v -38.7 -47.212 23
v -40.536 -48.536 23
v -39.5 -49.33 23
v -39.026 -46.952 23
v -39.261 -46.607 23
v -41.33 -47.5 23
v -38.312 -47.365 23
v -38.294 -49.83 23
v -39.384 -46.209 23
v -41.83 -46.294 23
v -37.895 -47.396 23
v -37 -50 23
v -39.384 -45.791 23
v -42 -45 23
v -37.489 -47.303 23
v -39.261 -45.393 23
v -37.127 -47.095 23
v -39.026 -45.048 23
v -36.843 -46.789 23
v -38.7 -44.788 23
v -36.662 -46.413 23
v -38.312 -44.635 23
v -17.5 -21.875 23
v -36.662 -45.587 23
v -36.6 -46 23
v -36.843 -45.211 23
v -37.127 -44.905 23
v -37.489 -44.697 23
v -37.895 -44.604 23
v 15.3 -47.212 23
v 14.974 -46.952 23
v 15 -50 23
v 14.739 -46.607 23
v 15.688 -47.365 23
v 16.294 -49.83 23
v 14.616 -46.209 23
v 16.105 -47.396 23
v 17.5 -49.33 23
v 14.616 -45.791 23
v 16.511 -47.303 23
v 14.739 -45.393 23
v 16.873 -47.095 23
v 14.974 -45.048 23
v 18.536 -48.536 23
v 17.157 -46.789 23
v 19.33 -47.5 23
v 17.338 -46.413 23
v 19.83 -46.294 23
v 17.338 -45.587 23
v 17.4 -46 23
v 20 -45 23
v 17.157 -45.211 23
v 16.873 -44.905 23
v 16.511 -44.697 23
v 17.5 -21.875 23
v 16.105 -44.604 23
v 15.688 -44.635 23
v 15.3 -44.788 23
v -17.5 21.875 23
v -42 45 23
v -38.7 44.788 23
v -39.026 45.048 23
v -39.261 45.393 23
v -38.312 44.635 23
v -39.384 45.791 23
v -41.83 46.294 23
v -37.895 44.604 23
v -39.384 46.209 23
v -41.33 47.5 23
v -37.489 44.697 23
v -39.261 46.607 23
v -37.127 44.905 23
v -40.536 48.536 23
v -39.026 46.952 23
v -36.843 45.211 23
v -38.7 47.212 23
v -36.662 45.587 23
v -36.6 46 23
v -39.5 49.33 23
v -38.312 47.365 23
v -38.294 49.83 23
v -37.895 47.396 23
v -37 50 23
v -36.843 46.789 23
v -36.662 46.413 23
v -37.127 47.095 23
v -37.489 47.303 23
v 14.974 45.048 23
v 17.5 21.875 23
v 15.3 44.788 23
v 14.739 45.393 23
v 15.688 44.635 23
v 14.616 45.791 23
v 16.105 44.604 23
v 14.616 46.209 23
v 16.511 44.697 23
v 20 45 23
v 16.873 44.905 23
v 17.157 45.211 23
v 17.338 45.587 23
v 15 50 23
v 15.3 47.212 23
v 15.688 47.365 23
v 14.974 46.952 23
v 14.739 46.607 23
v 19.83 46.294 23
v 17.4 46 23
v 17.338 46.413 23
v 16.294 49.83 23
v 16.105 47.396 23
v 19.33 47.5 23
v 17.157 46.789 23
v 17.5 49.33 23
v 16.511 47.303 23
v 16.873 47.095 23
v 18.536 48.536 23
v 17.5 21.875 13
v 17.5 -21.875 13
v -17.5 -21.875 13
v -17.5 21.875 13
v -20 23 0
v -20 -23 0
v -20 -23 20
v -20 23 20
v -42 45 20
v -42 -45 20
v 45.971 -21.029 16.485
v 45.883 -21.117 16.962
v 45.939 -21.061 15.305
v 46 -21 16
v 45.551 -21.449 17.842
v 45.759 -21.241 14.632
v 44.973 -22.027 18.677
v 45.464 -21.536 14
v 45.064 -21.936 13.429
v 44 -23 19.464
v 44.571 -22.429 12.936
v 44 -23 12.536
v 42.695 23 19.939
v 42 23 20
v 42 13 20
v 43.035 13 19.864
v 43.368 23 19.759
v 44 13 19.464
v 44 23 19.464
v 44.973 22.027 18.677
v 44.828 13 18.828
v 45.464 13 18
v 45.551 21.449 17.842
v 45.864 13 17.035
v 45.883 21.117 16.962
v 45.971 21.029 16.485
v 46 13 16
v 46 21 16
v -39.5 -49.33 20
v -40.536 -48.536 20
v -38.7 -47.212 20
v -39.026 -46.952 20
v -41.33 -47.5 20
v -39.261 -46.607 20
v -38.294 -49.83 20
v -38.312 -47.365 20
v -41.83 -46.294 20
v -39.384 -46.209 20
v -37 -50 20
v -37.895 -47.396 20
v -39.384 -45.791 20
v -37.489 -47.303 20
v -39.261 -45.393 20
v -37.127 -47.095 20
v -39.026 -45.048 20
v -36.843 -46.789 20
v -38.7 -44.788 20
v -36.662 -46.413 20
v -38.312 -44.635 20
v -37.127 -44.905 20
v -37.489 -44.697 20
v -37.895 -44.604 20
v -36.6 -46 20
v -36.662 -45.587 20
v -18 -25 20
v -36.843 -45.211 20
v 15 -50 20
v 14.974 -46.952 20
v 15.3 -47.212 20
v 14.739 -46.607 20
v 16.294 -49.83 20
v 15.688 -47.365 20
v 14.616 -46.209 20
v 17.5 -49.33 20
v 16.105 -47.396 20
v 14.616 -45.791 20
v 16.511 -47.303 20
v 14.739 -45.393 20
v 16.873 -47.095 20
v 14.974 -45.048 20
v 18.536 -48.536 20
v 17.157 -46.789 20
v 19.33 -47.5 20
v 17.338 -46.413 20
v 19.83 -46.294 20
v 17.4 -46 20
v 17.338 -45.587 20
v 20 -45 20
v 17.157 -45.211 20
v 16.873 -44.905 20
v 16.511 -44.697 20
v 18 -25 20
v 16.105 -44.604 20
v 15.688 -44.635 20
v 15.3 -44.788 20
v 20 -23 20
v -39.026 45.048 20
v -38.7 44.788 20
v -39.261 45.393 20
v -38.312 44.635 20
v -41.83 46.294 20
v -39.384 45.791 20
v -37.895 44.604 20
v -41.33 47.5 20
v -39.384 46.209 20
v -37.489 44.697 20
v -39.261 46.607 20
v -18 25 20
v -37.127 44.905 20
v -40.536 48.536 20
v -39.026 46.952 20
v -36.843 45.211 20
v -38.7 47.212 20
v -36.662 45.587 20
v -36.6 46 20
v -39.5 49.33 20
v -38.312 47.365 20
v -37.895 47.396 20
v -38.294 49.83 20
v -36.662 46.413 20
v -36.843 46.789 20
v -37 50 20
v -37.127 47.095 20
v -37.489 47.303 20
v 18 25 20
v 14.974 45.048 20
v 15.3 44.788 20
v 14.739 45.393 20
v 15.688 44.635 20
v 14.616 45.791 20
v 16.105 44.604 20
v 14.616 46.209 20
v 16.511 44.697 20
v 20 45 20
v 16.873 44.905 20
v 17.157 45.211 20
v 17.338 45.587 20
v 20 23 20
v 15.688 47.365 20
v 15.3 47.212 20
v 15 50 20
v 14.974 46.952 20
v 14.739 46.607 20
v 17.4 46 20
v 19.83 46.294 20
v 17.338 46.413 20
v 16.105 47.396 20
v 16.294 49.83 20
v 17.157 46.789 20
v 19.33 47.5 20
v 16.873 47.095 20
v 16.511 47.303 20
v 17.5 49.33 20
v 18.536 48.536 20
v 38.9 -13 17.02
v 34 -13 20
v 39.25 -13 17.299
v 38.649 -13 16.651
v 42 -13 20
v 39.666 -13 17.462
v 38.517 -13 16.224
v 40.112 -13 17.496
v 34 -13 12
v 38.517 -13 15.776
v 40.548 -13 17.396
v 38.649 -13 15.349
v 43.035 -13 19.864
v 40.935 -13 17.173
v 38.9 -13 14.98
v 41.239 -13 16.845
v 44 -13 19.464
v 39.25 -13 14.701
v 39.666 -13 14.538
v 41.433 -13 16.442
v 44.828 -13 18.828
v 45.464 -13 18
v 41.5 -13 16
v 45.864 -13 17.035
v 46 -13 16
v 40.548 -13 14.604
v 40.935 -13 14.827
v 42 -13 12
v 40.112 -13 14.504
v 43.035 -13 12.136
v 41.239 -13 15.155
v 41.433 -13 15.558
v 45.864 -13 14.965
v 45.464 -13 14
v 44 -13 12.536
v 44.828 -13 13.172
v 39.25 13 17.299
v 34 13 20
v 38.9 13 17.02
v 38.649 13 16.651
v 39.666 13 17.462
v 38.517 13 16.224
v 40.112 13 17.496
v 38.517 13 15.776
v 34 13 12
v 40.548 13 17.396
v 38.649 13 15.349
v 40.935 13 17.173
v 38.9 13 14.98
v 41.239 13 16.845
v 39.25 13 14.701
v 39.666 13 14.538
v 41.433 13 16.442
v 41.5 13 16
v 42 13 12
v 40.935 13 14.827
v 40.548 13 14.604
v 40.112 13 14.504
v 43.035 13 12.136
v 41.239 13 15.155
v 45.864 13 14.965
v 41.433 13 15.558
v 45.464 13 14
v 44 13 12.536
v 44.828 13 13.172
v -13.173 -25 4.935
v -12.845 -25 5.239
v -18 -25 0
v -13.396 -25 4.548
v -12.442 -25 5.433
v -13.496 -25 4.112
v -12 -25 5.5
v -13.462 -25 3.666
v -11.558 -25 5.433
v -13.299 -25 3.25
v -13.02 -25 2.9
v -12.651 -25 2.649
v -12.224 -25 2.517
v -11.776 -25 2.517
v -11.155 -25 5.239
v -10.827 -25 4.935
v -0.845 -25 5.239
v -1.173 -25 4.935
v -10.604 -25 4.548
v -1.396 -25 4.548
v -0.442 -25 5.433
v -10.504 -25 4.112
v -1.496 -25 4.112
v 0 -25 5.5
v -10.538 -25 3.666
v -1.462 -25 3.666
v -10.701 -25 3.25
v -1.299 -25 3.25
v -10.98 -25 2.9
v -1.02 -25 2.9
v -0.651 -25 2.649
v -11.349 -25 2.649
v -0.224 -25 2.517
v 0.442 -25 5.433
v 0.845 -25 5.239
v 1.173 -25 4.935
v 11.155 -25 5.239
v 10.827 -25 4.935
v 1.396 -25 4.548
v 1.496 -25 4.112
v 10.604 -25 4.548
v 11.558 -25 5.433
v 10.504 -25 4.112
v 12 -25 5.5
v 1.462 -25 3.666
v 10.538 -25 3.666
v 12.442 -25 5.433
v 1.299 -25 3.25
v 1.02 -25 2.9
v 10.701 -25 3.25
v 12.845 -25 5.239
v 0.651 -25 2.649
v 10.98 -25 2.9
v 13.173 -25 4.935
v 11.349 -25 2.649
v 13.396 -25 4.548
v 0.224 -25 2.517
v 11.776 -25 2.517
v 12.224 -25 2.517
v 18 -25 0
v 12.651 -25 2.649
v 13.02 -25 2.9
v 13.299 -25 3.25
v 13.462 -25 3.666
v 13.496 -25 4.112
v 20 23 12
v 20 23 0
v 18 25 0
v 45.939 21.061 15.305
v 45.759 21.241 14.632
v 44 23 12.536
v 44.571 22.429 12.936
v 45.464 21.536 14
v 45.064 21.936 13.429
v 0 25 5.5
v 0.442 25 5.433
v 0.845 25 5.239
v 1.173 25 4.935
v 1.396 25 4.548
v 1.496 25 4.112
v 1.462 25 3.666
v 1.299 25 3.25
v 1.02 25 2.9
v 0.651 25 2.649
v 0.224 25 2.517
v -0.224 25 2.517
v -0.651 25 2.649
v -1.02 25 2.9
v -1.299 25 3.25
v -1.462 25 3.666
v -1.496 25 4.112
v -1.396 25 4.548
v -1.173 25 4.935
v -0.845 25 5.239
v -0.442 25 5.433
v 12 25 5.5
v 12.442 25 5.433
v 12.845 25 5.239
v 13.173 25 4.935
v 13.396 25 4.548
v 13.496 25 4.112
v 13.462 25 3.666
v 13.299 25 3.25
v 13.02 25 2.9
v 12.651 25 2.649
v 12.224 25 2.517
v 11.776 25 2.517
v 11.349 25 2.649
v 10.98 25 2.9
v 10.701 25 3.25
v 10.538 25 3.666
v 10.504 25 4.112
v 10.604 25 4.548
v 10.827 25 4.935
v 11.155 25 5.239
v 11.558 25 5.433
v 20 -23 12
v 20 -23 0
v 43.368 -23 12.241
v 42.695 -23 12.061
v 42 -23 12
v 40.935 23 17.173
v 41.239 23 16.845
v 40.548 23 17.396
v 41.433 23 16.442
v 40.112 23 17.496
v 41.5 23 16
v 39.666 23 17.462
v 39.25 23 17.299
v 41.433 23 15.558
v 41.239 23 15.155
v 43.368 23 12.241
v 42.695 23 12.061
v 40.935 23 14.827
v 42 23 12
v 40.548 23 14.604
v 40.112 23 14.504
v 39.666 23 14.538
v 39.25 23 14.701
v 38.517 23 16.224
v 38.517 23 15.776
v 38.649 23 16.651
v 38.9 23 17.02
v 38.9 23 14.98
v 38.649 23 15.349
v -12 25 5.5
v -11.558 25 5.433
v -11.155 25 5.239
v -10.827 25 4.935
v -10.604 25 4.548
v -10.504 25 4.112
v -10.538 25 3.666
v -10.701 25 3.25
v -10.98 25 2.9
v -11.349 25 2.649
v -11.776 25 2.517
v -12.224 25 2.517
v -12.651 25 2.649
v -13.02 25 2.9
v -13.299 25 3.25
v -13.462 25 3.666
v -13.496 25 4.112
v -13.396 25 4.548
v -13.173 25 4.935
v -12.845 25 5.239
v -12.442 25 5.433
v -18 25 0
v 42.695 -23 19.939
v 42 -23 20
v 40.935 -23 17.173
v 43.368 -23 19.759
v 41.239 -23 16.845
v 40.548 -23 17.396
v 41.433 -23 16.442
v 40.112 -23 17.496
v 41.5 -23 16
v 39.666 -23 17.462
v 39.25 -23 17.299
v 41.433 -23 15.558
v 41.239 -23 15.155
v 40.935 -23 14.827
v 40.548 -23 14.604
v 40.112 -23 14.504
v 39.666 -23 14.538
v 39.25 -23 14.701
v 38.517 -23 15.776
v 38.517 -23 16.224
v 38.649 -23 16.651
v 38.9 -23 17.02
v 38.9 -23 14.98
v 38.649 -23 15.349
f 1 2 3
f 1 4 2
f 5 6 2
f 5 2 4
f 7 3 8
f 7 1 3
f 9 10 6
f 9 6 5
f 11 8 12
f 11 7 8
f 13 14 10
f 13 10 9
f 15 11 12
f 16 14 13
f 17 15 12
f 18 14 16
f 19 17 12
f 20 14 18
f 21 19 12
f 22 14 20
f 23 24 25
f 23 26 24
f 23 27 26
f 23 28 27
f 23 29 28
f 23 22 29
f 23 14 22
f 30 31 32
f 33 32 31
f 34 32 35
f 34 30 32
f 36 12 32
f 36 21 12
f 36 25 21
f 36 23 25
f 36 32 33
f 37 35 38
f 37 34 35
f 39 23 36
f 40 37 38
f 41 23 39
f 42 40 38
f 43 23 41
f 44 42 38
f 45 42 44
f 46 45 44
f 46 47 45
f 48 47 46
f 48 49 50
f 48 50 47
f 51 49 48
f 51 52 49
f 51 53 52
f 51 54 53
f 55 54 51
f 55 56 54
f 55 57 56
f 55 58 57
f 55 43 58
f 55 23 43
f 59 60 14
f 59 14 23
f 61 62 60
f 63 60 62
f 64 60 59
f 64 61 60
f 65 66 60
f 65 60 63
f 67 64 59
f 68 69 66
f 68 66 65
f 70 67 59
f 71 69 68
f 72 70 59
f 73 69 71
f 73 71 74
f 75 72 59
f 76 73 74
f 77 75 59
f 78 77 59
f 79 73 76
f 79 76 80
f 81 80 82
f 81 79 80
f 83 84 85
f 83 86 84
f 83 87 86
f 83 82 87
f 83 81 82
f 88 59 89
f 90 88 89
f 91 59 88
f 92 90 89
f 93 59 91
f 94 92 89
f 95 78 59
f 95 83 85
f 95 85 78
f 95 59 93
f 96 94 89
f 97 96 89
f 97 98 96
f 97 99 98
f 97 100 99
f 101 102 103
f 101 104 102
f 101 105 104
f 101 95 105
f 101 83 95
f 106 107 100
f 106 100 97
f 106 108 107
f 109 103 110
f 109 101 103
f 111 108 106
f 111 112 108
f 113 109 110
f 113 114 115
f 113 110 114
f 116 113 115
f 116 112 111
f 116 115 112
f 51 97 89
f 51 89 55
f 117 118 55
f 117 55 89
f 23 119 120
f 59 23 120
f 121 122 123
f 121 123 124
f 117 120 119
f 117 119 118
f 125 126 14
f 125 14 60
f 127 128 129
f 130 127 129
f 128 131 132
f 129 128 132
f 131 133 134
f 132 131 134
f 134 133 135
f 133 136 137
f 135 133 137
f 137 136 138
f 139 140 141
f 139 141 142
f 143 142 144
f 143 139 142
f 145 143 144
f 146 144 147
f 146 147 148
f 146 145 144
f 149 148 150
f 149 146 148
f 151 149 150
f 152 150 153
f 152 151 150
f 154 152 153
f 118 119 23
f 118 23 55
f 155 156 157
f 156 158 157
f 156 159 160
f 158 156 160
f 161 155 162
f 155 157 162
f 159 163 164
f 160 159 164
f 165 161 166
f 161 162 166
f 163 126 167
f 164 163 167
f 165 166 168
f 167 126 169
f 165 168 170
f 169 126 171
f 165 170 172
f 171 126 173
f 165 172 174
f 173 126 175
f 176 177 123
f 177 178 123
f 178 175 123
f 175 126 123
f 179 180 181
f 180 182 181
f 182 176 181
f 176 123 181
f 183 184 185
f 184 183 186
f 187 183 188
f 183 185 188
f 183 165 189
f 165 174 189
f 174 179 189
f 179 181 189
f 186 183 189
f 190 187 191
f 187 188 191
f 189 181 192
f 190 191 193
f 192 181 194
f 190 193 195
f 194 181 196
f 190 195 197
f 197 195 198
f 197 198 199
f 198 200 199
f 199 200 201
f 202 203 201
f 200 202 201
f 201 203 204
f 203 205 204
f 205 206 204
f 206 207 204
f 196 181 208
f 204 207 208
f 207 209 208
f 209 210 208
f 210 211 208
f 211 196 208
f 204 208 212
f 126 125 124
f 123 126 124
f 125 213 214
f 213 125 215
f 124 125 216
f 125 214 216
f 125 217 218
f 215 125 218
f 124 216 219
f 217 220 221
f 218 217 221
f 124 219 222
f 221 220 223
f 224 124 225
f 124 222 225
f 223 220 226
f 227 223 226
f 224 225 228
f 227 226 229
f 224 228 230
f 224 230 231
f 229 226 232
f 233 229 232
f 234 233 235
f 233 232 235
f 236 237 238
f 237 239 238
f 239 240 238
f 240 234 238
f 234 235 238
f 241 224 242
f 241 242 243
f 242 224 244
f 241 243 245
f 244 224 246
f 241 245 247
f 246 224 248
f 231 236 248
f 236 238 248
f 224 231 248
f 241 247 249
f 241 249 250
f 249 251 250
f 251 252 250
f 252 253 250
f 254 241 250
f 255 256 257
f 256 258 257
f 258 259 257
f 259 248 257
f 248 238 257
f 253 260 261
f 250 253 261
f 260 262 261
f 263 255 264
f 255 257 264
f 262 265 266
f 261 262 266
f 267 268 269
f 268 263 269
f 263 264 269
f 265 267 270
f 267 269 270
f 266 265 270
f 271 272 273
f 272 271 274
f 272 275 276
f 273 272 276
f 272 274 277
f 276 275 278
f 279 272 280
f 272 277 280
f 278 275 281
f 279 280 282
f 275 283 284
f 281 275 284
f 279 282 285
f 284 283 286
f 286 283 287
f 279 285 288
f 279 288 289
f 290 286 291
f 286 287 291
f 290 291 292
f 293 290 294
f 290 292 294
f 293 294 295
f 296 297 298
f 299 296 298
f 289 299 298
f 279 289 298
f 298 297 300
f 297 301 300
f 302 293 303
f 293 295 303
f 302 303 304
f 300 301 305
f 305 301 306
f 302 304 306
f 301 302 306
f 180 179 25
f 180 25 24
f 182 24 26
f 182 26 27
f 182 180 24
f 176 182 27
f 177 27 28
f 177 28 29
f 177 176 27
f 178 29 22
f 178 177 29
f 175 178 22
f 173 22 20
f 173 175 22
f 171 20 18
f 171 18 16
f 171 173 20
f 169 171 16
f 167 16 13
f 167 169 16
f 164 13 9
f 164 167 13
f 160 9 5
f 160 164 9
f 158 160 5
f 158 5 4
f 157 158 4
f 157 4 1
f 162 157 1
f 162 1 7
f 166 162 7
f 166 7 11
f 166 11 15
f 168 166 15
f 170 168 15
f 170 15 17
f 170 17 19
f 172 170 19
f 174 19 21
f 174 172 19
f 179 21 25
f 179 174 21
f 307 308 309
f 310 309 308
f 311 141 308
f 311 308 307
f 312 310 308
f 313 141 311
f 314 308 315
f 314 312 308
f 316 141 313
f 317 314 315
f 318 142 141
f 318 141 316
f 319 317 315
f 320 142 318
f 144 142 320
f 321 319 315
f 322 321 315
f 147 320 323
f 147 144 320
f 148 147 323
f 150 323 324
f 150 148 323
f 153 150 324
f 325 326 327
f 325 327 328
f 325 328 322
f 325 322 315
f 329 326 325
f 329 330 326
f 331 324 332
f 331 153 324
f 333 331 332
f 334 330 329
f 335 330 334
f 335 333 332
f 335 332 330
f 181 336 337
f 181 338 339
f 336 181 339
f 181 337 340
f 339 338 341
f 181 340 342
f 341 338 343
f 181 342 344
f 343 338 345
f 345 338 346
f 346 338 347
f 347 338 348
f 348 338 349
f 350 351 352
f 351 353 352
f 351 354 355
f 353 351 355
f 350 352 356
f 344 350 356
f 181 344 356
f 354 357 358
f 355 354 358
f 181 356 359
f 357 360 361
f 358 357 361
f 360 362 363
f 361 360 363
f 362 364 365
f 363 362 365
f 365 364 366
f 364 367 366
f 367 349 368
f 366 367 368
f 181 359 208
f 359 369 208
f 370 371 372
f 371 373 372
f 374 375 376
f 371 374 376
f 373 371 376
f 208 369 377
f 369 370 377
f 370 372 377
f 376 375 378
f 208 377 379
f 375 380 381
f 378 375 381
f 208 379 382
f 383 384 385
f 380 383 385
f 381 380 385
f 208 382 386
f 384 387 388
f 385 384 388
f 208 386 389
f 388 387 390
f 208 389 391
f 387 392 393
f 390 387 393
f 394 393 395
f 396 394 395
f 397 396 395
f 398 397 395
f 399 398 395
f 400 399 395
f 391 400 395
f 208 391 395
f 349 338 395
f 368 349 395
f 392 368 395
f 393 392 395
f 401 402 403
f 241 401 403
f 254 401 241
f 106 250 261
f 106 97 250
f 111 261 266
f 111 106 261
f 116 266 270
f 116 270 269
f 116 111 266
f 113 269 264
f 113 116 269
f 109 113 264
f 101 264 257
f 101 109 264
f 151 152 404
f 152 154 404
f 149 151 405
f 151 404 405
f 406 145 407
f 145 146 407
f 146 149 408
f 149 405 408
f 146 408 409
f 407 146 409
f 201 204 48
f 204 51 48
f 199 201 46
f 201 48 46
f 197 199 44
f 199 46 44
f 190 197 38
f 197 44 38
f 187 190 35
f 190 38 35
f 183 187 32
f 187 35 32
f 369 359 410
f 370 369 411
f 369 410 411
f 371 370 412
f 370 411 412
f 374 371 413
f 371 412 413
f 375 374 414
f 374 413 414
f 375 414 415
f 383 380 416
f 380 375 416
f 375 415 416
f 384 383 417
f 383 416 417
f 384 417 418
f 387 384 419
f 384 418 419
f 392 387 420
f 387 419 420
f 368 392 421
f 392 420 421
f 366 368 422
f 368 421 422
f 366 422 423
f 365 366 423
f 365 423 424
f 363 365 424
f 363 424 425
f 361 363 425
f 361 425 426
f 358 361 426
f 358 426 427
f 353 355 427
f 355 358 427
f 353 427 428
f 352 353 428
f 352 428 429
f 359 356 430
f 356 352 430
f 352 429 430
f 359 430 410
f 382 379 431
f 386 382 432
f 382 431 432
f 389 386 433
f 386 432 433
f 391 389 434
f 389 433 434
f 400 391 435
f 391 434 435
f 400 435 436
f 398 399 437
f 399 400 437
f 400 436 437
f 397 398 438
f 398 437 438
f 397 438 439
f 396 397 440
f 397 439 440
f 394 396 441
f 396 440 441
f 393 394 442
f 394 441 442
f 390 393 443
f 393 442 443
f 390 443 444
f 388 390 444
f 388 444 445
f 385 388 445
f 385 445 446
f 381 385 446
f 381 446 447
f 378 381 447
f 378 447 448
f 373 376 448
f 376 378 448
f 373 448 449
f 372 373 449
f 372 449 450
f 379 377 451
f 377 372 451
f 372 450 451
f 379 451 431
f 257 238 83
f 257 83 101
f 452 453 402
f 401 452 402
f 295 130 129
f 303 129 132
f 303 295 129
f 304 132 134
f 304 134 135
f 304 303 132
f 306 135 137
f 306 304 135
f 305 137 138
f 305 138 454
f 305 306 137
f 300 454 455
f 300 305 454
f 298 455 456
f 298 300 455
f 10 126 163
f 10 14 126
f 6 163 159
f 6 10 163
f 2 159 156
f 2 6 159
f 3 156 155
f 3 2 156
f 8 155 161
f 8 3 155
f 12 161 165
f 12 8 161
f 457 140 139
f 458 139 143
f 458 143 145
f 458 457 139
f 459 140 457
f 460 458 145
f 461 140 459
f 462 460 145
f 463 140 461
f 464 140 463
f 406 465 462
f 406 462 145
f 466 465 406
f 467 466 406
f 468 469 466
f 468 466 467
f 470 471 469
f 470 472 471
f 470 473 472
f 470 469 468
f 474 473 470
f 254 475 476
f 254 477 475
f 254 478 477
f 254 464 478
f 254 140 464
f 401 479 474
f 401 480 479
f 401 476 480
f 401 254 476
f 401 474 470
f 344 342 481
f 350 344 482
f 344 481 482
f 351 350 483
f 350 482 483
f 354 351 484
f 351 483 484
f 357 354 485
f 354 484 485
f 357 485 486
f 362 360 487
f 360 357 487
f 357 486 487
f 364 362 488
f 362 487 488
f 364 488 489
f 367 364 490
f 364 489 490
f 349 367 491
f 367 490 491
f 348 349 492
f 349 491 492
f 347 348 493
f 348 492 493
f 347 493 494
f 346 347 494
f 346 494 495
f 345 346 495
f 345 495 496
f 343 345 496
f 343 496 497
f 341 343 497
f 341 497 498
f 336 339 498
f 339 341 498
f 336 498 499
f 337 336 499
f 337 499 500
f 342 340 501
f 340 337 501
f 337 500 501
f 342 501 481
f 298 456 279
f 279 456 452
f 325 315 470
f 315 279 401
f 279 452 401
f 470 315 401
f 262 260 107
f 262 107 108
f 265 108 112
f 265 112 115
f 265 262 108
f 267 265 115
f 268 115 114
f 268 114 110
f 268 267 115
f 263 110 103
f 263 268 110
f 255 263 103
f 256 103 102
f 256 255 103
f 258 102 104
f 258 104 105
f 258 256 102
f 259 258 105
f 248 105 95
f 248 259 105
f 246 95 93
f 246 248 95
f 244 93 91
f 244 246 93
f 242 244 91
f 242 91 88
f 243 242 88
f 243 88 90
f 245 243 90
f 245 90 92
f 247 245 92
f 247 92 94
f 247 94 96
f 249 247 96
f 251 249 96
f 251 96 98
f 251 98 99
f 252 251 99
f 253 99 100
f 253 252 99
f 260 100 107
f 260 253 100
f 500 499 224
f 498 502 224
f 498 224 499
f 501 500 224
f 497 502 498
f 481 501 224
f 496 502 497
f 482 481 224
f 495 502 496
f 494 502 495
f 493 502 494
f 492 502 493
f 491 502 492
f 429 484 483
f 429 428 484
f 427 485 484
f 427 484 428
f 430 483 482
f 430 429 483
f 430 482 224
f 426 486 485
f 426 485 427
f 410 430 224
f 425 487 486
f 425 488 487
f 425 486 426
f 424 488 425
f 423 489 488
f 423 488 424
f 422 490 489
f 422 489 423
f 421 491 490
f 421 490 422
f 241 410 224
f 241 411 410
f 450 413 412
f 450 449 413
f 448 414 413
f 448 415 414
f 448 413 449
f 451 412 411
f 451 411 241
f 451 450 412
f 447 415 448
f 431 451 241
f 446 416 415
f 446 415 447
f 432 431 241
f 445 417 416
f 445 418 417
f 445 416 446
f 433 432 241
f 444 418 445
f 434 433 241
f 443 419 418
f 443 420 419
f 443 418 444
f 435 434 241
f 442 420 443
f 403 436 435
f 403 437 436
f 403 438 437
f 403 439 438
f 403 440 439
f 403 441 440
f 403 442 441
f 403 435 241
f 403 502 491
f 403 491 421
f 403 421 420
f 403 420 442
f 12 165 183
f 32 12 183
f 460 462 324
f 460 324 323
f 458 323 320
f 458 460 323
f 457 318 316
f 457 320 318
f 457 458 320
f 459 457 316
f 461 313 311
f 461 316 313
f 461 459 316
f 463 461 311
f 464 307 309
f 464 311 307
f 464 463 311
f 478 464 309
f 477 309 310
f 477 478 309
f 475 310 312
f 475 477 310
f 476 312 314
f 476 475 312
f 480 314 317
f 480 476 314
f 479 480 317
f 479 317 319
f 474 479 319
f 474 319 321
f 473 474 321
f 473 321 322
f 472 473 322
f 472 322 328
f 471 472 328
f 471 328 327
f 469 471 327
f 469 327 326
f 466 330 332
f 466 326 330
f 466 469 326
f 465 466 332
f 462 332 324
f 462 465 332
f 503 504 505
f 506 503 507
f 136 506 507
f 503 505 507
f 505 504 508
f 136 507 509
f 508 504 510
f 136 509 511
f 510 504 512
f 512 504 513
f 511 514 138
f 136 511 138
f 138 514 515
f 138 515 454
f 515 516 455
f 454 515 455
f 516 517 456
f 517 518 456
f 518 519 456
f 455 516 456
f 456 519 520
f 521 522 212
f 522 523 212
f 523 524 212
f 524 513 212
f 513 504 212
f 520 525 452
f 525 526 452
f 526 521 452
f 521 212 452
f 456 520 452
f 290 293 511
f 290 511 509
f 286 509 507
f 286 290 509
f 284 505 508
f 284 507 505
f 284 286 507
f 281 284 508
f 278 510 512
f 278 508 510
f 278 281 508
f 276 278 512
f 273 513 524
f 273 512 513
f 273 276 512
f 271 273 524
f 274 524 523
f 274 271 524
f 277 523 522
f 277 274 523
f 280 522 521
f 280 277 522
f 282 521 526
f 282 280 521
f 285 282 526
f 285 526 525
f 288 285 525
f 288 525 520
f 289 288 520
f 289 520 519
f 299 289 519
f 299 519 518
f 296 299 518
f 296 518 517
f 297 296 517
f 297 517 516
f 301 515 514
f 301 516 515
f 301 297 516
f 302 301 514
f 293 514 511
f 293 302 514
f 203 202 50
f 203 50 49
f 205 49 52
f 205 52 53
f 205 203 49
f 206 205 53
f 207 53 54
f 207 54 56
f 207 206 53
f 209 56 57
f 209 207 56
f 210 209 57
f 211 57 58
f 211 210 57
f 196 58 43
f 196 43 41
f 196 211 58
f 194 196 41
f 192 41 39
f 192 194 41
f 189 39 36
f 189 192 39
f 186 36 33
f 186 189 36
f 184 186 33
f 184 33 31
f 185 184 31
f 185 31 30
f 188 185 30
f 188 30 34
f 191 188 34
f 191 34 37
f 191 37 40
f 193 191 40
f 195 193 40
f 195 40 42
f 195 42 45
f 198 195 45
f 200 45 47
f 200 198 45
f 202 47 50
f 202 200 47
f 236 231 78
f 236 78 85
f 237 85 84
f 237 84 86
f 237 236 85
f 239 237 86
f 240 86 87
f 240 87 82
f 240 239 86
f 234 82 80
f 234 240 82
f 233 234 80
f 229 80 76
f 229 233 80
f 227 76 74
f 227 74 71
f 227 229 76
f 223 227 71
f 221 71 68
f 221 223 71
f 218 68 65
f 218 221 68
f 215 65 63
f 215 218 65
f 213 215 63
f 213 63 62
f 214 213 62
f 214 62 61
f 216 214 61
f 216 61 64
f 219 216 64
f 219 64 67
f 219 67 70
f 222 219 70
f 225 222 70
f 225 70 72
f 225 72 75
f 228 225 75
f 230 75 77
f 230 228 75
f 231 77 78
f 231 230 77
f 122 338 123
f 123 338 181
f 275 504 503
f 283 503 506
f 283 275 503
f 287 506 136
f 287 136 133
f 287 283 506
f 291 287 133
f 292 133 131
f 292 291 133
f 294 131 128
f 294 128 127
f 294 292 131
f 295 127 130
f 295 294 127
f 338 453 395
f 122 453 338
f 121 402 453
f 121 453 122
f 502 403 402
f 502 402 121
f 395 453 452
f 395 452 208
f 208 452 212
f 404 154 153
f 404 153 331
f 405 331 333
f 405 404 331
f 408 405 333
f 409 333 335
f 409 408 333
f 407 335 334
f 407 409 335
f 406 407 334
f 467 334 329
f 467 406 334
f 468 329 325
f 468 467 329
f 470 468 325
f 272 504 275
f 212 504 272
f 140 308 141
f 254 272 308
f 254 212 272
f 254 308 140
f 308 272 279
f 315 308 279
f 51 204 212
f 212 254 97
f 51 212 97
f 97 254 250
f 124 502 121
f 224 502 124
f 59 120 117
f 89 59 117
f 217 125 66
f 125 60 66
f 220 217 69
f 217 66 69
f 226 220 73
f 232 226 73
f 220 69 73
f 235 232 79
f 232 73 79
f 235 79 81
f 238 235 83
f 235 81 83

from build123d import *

# Parameters (mm, degrees)
SKETCH_1_W                      = 40
SKETCH_1_H                      = 50
SKETCH_1_W_2                    = 35
SKETCH_1_H_2                    = 43.75
EXTRUDE_1_DEPTH                 = 20
CHAMFER_1_SIZE                  = 2
SKETCH_4_R                      = 1.5
CUT_EXTRUDE_3_DEPTH             = 6
SKETCH_7_W                      = 8
SKETCH_7_H                      = 46
EXTRUDE_2_DEPTH                 = 26
SKETCH_8_W                      = 8
SKETCH_8_H                      = 26
CUT_EXTRUDE_5_DEPTH             = 12
CHAMFER_2_SIZE                  = 2
FILLET_1_R                      = 4
CUT_EXTRUDE_6_DEPTH             = 70.426219831
CUT_EXTRUDE_6_DEPTH_BACK        = 70.426219831
SKETCH_9_R                      = 1.5
SKETCH_10_W                     = 35
SKETCH_10_H                     = 43.75
EXTRUDE_4_DEPTH                 = 2
SKETCH_11_W                     = 62
SKETCH_11_H                     = 100
SKETCH_11_R                     = 1.4
SKETCH_11_W_2                   = 35
SKETCH_11_H_2                   = 43.75
EXTRUDE_5_DEPTH                 = 3
FILLET_2_R                      = 5
SKETCH_12_W                     = 35
SKETCH_12_H                     = 43.75
EXTRUDE_6_DEPTH                 = 11
CUT_EXTRUDE_4_REACH             = 92.94
SKETCH_5_R                      = 1.5
CUT_EXTRUDE_4_DIRECTION_2_DEPTH = 91.939540355


with BuildPart() as part:
    # 草图1 → 凸台-拉伸1 (new body)
    with BuildSketch(Plane.XY):
        Rectangle(SKETCH_1_W, SKETCH_1_H)
        Rectangle(SKETCH_1_W_2, SKETCH_1_H_2, mode=Mode.SUBTRACT)
    extrude(amount=EXTRUDE_1_DEPTH)

    # 倒角1
    chamfer_1_edges = [part.edges().sort_by_distance(p)[0] for p in [
        (20, -25, 10),
        (-20, -25, 10),
        (-20, 25, 10),
        (20, 25, 10),
    ]]
    chamfer(chamfer_1_edges, length=CHAMFER_1_SIZE)

    # 草图4 → 切除-拉伸3 (cut)
    with BuildSketch(Plane(origin=(0, 25, 0), x_dir=(1, 0, 0), z_dir=(0, 1, 0))):
        with Locations(Location((-12, -4, 0), (0, 0, 270))):
            Circle(SKETCH_4_R)
        with Locations(Location((0, -4, 0), (0, 0, 270))):
            Circle(SKETCH_4_R)
        with Locations(Location((12, -4, 0), (0, 0, 270))):
            Circle(SKETCH_4_R)
    extrude(amount=-CUT_EXTRUDE_3_DEPTH, mode=Mode.SUBTRACT)

    # 草图7 → 凸台-拉伸2 (add)
    with BuildSketch(Plane(origin=(20, 0, 0), x_dir=(0, 0, -1), z_dir=(1, 0, 0))):
        with Locations((-16, 0)):
            Rectangle(SKETCH_7_W, SKETCH_7_H)
    extrude(amount=EXTRUDE_2_DEPTH)

    # 草图8 → 切除-拉伸5 (cut)
    with BuildSketch(Plane(origin=(46, 0, 0), x_dir=(0, 0, -1), z_dir=(1, 0, 0))):
        with Locations((-16, 0)):
            Rectangle(SKETCH_8_W, SKETCH_8_H)
    extrude(amount=-CUT_EXTRUDE_5_DEPTH, mode=Mode.SUBTRACT)

    # 倒角2
    chamfer_2_edges = [part.edges().sort_by_distance(p)[0] for p in [
        (46, -23, 16),
        (46, 23, 16),
    ]]
    chamfer(chamfer_2_edges, length=CHAMFER_2_SIZE)

    # 圆角1
    fillet_1_edges = [part.edges().sort_by_distance(p)[0] for p in [
        (46, -17, 12),
        (46, -17, 20),
        (46, 17, 12),
        (46, 17, 20),
    ]]
    fillet(fillet_1_edges, radius=FILLET_1_R - 0.0001)  # a hair under: the kernel refuses the full size

    # 草图9 → 切除-拉伸6 (cut, two sides: drawn at the far end of the back side and taken through both)
    with BuildSketch(Plane.XZ.offset(23).offset(-CUT_EXTRUDE_6_DEPTH_BACK)):
        with Locations((40, 16)):
            Circle(SKETCH_9_R)
    extrude(amount=CUT_EXTRUDE_6_DEPTH + CUT_EXTRUDE_6_DEPTH_BACK, mode=Mode.SUBTRACT)

    # 草图10 → 凸台-拉伸4 (add)
    with BuildSketch(Plane(origin=(0, 0, 0), x_dir=(-1, 0, 0), z_dir=(0, 0, -1))):
        Rectangle(SKETCH_10_W, SKETCH_10_H)
    extrude(amount=-EXTRUDE_4_DEPTH)

    # 草图11 → 凸台-拉伸5 (add)
    with BuildSketch(Plane.XY.offset(20)):
        with Locations((-11, 0)):
            Rectangle(SKETCH_11_W, SKETCH_11_H)
        with Locations((-38, 46)):
            Circle(SKETCH_11_R, mode=Mode.SUBTRACT)
        with Locations((16, 46)):
            Circle(SKETCH_11_R, mode=Mode.SUBTRACT)
        with Locations((-38, -46)):
            Circle(SKETCH_11_R, mode=Mode.SUBTRACT)
        with Locations((16, -46)):
            Circle(SKETCH_11_R, mode=Mode.SUBTRACT)
        Rectangle(SKETCH_11_W_2, SKETCH_11_H_2, mode=Mode.SUBTRACT)
    extrude(amount=EXTRUDE_5_DEPTH)

    # 圆角2
    fillet_2_edges = [part.edges().sort_by_distance(p)[0] for p in [
        (20, -50, 21.5),
        (20, 50, 21.5),
        (-42, 50, 21.5),
        (-42, -50, 21.5),
    ]]
    fillet(fillet_2_edges, radius=FILLET_2_R)

    # 草图12 → 凸台-拉伸6 (add)
    with BuildSketch(Plane.XY.offset(2)):
        Rectangle(SKETCH_12_W, SKETCH_12_H)
    extrude(amount=EXTRUDE_6_DEPTH)

    # 草图5 → 切除-拉伸4 (cut, up to next)
    with BuildSketch(Plane.XZ.offset(25), mode=Mode.PRIVATE) as cut_extrude_4_sk1:
        with Locations(Location((-12, 4, 0), (0, 0, 90))):
            Circle(SKETCH_5_R)
    cut_extrude_4_tool1 = extrude(cut_extrude_4_sk1.sketch, amount=-CUT_EXTRUDE_4_REACH, mode=Mode.PRIVATE) & part.part
    # 草图5 → 切除-拉伸4 (cut, up to next)
    with BuildSketch(Plane.XZ.offset(25), mode=Mode.PRIVATE) as cut_extrude_4_sk2:
        with Locations(Location((0, 4, 0), (0, 0, 90))):
            Circle(SKETCH_5_R)
    cut_extrude_4_tool2 = extrude(cut_extrude_4_sk2.sketch, amount=-CUT_EXTRUDE_4_REACH, mode=Mode.PRIVATE) & part.part
    # 草图5 → 切除-拉伸4 (cut, up to next)
    with BuildSketch(Plane.XZ.offset(25), mode=Mode.PRIVATE) as cut_extrude_4_sk3:
        with Locations(Location((12, 4, 0), (0, 0, 90))):
            Circle(SKETCH_5_R)
    cut_extrude_4_tool3 = extrude(cut_extrude_4_sk3.sketch, amount=-CUT_EXTRUDE_4_REACH, mode=Mode.PRIVATE) & part.part
    add(cut_extrude_4_tool1.solids().sort_by_distance((-12, -25, 4))[0], mode=Mode.SUBTRACT)
    add(cut_extrude_4_tool2.solids().sort_by_distance((0, -25, 4))[0], mode=Mode.SUBTRACT)
    add(cut_extrude_4_tool3.solids().sort_by_distance((12, -25, 4))[0], mode=Mode.SUBTRACT)

    # 草图5 → 切除-拉伸4 direction 2 (cut)
    with BuildSketch(Plane.XZ.offset(25)):
        with Locations(Location((-12, 4, 0), (0, 0, 90))):
            Circle(SKETCH_5_R)
        with Locations(Location((0, 4, 0), (0, 0, 90))):
            Circle(SKETCH_5_R)
        with Locations(Location((12, 4, 0), (0, 0, 90))):
            Circle(SKETCH_5_R)
    extrude(amount=CUT_EXTRUDE_4_DIRECTION_2_DEPTH, mode=Mode.SUBTRACT)


solid = part.part
